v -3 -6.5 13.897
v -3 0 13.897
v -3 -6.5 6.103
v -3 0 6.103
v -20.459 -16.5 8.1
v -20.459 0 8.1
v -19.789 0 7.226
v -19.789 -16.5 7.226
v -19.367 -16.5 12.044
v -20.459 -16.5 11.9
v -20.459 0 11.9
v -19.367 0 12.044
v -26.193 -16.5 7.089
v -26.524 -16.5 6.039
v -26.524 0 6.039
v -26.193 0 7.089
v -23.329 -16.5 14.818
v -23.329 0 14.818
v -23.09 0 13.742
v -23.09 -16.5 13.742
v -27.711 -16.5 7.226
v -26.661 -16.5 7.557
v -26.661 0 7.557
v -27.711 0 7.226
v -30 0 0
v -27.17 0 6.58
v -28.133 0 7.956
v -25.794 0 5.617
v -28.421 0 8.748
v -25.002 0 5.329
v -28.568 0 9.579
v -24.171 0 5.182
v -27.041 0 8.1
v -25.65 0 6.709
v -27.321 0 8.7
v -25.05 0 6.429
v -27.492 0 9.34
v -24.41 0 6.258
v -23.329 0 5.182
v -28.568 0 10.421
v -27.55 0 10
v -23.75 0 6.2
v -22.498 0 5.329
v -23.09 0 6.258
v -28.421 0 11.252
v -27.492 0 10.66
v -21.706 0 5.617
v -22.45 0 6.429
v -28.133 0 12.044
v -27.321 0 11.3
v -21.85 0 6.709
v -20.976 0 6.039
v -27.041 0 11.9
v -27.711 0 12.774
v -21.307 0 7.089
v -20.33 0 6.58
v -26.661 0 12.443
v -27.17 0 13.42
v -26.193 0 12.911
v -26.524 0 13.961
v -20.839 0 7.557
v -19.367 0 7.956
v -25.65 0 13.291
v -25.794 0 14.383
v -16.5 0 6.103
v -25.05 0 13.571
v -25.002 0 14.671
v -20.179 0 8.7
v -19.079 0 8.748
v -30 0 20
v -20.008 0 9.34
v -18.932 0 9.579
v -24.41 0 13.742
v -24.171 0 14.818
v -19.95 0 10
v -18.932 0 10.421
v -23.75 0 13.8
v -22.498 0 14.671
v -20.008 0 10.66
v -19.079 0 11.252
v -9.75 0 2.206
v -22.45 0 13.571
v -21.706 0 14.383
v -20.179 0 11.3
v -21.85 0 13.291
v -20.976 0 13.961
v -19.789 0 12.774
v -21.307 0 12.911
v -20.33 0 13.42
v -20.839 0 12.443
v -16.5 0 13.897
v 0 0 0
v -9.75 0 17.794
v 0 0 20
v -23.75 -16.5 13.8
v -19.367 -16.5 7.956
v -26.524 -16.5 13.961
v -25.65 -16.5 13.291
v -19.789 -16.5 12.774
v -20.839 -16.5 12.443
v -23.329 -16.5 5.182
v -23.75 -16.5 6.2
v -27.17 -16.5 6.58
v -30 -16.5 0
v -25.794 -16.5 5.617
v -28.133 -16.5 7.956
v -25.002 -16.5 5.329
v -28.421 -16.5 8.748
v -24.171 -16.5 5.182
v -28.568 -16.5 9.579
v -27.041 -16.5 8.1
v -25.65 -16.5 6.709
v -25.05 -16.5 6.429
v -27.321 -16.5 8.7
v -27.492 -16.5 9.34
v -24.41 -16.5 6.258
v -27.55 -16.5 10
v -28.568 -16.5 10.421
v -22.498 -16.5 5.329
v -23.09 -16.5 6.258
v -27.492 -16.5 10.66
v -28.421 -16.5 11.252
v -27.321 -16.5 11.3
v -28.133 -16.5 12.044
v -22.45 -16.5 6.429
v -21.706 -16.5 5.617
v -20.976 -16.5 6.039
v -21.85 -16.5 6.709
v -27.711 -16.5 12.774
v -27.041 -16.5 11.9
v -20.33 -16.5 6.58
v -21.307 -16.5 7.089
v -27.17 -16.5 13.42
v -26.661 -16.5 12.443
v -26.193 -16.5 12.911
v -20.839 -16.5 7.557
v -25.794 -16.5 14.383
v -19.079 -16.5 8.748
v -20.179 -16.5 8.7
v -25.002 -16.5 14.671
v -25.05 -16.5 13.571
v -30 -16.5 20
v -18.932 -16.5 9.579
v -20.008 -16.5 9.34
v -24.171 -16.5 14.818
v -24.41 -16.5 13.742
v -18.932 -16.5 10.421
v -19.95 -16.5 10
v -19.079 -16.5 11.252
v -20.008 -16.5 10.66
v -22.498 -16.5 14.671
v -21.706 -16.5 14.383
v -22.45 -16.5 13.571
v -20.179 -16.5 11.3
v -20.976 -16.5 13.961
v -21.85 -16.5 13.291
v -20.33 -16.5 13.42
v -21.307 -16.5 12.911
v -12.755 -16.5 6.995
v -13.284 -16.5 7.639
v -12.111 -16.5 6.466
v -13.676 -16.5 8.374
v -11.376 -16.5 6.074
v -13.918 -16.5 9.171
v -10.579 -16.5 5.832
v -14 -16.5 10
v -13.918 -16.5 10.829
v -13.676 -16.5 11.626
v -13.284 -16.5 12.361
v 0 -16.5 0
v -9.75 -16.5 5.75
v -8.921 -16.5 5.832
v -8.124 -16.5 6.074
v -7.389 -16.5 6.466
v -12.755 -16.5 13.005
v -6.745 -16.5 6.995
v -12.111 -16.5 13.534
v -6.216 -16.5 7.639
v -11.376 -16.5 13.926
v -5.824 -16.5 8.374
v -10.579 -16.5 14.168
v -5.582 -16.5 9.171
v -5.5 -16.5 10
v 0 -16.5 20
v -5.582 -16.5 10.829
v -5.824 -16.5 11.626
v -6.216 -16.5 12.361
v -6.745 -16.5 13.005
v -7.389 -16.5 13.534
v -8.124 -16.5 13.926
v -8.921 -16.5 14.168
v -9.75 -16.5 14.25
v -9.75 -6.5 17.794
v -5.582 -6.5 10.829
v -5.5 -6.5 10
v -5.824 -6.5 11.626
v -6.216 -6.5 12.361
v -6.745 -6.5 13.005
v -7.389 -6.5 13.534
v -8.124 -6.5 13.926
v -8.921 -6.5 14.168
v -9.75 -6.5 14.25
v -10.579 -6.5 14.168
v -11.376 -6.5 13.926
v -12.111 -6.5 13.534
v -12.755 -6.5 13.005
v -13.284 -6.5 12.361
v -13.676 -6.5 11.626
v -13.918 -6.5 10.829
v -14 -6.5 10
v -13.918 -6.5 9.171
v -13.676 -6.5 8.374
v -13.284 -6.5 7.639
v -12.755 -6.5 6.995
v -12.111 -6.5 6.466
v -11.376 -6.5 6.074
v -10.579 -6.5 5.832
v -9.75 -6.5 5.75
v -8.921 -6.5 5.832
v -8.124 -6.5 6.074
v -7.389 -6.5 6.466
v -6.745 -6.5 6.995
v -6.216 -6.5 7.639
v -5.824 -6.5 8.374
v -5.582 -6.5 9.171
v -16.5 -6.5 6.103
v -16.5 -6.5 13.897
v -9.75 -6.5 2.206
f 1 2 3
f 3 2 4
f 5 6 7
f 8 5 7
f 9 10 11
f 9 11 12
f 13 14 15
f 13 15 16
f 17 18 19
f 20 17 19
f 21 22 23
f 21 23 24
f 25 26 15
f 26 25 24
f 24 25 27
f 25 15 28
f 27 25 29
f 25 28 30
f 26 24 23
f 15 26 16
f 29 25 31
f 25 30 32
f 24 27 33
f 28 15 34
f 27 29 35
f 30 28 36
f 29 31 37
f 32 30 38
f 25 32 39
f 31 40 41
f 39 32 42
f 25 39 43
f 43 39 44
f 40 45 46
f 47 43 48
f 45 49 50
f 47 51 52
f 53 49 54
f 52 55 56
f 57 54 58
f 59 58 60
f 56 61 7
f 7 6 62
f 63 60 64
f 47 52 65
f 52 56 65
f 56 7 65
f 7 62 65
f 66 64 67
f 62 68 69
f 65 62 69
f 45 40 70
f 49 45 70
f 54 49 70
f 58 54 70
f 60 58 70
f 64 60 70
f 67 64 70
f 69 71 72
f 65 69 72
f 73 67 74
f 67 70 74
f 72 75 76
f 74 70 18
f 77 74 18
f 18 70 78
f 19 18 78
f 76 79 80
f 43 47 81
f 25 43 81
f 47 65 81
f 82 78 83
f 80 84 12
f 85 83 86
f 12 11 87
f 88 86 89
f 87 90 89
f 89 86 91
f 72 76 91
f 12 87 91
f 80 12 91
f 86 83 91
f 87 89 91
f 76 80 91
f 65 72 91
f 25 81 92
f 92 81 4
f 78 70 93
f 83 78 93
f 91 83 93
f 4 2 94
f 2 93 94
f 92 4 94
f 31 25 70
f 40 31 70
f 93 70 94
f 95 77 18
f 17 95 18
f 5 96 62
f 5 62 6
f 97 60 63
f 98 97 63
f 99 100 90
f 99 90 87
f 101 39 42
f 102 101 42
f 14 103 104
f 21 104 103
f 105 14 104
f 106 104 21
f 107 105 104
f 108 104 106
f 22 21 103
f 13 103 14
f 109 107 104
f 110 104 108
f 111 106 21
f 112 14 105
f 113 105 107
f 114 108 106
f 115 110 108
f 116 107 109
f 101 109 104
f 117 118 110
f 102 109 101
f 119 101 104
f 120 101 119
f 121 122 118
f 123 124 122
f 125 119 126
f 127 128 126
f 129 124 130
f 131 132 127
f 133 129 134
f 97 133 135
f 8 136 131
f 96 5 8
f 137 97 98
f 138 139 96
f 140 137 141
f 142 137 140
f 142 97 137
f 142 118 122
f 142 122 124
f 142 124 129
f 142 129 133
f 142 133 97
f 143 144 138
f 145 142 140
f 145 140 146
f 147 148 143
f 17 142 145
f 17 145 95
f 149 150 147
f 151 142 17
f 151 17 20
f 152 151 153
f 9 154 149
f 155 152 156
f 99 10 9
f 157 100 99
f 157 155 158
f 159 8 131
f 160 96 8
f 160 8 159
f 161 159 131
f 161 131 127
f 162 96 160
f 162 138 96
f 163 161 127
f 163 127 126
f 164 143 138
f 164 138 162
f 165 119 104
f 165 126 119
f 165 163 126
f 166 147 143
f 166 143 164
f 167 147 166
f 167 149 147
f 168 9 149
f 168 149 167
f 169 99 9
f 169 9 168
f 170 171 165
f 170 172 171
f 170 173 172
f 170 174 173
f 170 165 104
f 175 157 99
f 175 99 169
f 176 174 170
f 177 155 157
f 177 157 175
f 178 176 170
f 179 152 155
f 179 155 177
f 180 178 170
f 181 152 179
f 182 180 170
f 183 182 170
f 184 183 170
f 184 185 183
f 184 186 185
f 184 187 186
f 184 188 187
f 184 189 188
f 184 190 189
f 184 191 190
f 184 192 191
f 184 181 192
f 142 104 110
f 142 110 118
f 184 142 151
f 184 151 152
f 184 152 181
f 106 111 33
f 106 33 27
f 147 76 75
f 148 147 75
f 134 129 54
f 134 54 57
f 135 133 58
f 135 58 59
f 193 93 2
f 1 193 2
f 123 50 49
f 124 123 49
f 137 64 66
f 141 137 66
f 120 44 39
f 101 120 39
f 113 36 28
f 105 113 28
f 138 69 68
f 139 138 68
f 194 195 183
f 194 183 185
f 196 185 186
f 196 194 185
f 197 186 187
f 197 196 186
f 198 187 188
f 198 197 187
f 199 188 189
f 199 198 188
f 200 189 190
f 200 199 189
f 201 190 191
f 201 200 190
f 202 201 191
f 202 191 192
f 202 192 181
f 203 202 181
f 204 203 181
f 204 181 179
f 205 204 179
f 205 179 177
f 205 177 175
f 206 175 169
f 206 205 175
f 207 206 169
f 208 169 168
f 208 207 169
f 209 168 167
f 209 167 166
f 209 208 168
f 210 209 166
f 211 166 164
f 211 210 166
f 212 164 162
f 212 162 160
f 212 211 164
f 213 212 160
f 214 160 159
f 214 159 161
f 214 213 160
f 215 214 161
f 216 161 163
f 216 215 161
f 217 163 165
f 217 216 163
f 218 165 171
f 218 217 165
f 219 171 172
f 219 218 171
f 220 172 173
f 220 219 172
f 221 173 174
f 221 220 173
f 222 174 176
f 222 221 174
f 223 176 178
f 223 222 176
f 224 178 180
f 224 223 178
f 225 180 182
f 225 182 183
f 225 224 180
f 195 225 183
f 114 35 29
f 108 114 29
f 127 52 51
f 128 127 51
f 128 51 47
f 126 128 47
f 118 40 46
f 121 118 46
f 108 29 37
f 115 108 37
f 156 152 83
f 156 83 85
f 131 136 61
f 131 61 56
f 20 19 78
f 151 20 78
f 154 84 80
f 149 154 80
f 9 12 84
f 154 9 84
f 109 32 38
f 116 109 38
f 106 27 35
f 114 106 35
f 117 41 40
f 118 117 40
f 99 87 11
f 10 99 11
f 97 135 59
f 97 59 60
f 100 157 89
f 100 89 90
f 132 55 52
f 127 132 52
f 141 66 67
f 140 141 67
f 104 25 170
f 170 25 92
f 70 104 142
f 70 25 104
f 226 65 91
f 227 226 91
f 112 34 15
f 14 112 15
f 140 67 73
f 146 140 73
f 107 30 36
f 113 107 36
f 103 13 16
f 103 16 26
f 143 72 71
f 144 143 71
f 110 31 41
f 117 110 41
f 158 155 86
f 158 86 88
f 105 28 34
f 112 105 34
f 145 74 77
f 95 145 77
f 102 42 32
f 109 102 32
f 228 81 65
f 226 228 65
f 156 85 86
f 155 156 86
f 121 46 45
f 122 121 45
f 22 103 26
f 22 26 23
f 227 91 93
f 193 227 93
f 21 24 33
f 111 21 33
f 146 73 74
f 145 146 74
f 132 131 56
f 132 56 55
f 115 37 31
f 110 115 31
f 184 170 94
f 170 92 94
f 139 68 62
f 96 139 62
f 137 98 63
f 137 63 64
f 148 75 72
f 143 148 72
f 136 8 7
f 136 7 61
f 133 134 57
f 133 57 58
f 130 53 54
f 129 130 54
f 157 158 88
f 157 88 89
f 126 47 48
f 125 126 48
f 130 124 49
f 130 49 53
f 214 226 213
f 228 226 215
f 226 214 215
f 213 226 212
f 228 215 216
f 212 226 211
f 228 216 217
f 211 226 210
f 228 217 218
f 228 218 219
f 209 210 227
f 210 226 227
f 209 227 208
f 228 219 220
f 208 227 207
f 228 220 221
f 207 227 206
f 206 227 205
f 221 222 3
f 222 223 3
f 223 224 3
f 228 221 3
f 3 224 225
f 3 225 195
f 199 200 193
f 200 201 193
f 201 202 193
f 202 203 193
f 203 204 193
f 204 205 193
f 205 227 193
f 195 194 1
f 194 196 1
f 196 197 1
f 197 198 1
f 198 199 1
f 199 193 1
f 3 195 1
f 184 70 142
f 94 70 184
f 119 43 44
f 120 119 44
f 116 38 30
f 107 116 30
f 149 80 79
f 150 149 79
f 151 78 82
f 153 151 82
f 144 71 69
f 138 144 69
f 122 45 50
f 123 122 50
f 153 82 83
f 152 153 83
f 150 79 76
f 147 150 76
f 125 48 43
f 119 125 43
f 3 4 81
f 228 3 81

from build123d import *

# Parameters (mm, degrees)
F0_W     = 30
F0_H     = 20
F0_R     = 3.8
F1_DEPTH = 6.5
F2_W     = 30
F2_H     = 20
F2_R     = 3.8
F2_R_2   = 4.25
F3_DEPTH = 10
F5_DEPTH = 25


with BuildPart() as f1:
    # F0 (on Front) → F1 (new body)
    with BuildSketch(Plane.XZ):
        with Locations((-15, 10)):
            Rectangle(F0_W, F0_H)
        Polygon((-3, 6.102885683), (-9.75, 2.2057713659), (-16.5, 6.102885683), (-16.5, 13.897114317), (-9.75, 17.7942286341), (-3, 13.897114317), align=None, mode=Mode.SUBTRACT)
        with Locations((-23.75, 10)):
            Circle(F0_R, mode=Mode.SUBTRACT)
    extrude(amount=F1_DEPTH)

    # F2 (on face) → F3 (join)
    with BuildSketch(Plane.XZ.offset(6.5)):
        with Locations((-15, 10)):
            Rectangle(F2_W, F2_H)
        with Locations((-23.75, 10)):
            Circle(F2_R, mode=Mode.SUBTRACT)
        with Locations((-9.75, 10)):
            Circle(F2_R_2, mode=Mode.SUBTRACT)
    extrude(amount=F3_DEPTH)

    # F4 (on face) → F5 (cut)
    with BuildSketch(Plane(origin=(0, 0, 0), x_dir=(-1, 0, 0), z_dir=(0, 1, 0))):
        with BuildLine():
            ThreePointArc((23.0901369249, 13.7422694614), (23.4188081776, 13.7855398527), (23.75, 13.8))
            Line((23.75, 13.8), (23.3285195244, 14.8175438804))
            Line((23.3285195244, 14.8175438804), (23.0901369249, 13.7422694614))
        make_face()
        with BuildLine():
            Line((24.1714804756, 14.8175438804), (23.75, 13.8))
            ThreePointArc((23.75, 13.8), (24.0811918224, 13.7855398527), (24.4098630751, 13.7422694614))
            Line((24.4098630751, 13.7422694614), (24.1714804756, 14.8175438804))
        make_face()
        with BuildLine():
            ThreePointArc((24.4098630751, 13.7422694614), (24.0811918224, 13.7855398527), (23.75, 13.8))
            ThreePointArc((23.75, 13.8), (23.4188081776, 13.7855398527), (23.0901369249, 13.7422694614))
            ThreePointArc((23.0901369249, 13.7422694614), (22.7664876286, 13.6705181399), (22.4503234554, 13.570831959))
            ThreePointArc((22.4503234554, 13.570831959), (22.1440506054, 13.4439695907), (21.85, 13.2908965344))
            ThreePointArc((21.85, 13.2908965344), (21.5704095419, 13.1127777683), (21.3074070832, 12.9109688839))
            ThreePointArc((21.3074070832, 12.9109688839), (21.0629942315, 12.6870057685), (20.8390311161, 12.4425929168))
            ThreePointArc((20.8390311161, 12.4425929168), (20.6372222317, 12.1795904581), (20.4591034656, 11.9))
            ThreePointArc((20.4591034656, 11.9), (20.3060304093, 11.6059493946), (20.179168041, 11.2996765446))
            ThreePointArc((20.179168041, 11.2996765446), (20.0794818601, 10.9835123714), (20.0077305386, 10.6598630751))
            ThreePointArc((20.0077305386, 10.6598630751), (19.9644601473, 10.3311918224), (19.95, 10))
            ThreePointArc((19.95, 10), (19.9644601473, 9.6688081776), (20.0077305386, 9.3401369249))
            ThreePointArc((20.0077305386, 9.3401369249), (20.0794818601, 9.0164876286), (20.179168041, 8.7003234554))
            ThreePointArc((20.179168041, 8.7003234554), (20.3060304093, 8.3940506054), (20.4591034656, 8.1))
            ThreePointArc((20.4591034656, 8.1), (20.6372222317, 7.8204095419), (20.8390311161, 7.5574070832))
            ThreePointArc((20.8390311161, 7.5574070832), (21.0629942315, 7.3129942315), (21.3074070832, 7.0890311161))
            ThreePointArc((21.3074070832, 7.0890311161), (21.5704095419, 6.8872222317), (21.85, 6.7091034656))
            ThreePointArc((21.85, 6.7091034656), (22.1440506054, 6.5560304093), (22.4503234554, 6.429168041))
            ThreePointArc((22.4503234554, 6.429168041), (22.7664876286, 6.3294818601), (23.0901369249, 6.2577305386))
            ThreePointArc((23.0901369249, 6.2577305386), (23.4188081776, 6.2144601473), (23.75, 6.2))
            ThreePointArc((23.75, 6.2), (24.0811918224, 6.2144601473), (24.4098630751, 6.2577305386))
            ThreePointArc((24.4098630751, 6.2577305386), (24.7335123714, 6.3294818601), (25.0496765446, 6.429168041))
            ThreePointArc((25.0496765446, 6.429168041), (25.3559493946, 6.5560304093), (25.65, 6.7091034656))
            ThreePointArc((25.65, 6.7091034656), (25.9295904581, 6.8872222317), (26.1925929168, 7.0890311161))
            ThreePointArc((26.1925929168, 7.0890311161), (26.4370057685, 7.3129942315), (26.6609688839, 7.5574070832))
            ThreePointArc((26.6609688839, 7.5574070832), (26.8627777683, 7.8204095419), (27.0408965344, 8.1))
            ThreePointArc((27.0408965344, 8.1), (27.1939695907, 8.3940506054), (27.320831959, 8.7003234554))
            ThreePointArc((27.320831959, 8.7003234554), (27.4205181399, 9.0164876286), (27.4922694614, 9.3401369249))
            ThreePointArc((27.4922694614, 9.3401369249), (27.5355398527, 9.6688081776), (27.55, 10))
            ThreePointArc((27.55, 10), (27.5355398527, 10.3311918224), (27.4922694614, 10.6598630751))
            ThreePointArc((27.4922694614, 10.6598630751), (27.4205181399, 10.9835123714), (27.320831959, 11.2996765446))
            ThreePointArc((27.320831959, 11.2996765446), (27.1939695907, 11.6059493946), (27.0408965344, 11.9))
            ThreePointArc((27.0408965344, 11.9), (26.8627777683, 12.1795904581), (26.6609688839, 12.4425929168))
            ThreePointArc((26.6609688839, 12.4425929168), (26.4370057685, 12.6870057685), (26.1925929168, 12.9109688839))
            ThreePointArc((26.1925929168, 12.9109688839), (25.9295904581, 13.1127777683), (25.65, 13.2908965344))
            ThreePointArc((25.65, 13.2908965344), (25.3559493946, 13.4439695907), (25.0496765446, 13.570831959))
            ThreePointArc((25.0496765446, 13.570831959), (24.7335123714, 13.6705181399), (24.4098630751, 13.7422694614))
        make_face()
        with BuildLine():
            Line((25.0016349558, 14.6711652474), (24.4098630751, 13.7422694614))
            ThreePointArc((24.4098630751, 13.7422694614), (24.7335123714, 13.6705181399), (25.0496765446, 13.570831959))
            Line((25.0496765446, 13.570831959), (25.0016349558, 14.6711652474))
        make_face()
        with BuildLine():
            ThreePointArc((22.4503234554, 13.570831959), (22.7664876286, 13.6705181399), (23.0901369249, 13.7422694614))
            Line((23.0901369249, 13.7422694614), (22.4983650442, 14.6711652474))
            Line((22.4983650442, 14.6711652474), (22.4503234554, 13.570831959))
        make_face()
        with BuildLine():
            Line((25.7937591412, 14.3828556221), (25.0496765446, 13.570831959))
            ThreePointArc((25.0496765446, 13.570831959), (25.3559493946, 13.4439695907), (25.65, 13.2908965344))
            Line((25.65, 13.2908965344), (25.7937591412, 14.3828556221))
        make_face()
        with BuildLine():
            ThreePointArc((21.85, 13.2908965344), (22.1440506054, 13.4439695907), (22.4503234554, 13.570831959))
            Line((22.4503234554, 13.570831959), (21.7062408588, 14.3828556221))
            Line((21.7062408588, 14.3828556221), (21.85, 13.2908965344))
        make_face()
        with BuildLine():
            Line((26.5237847392, 13.9613751465), (25.65, 13.2908965344))
            ThreePointArc((25.65, 13.2908965344), (25.9295904581, 13.1127777683), (26.1925929168, 12.9109688839))
            Line((26.1925929168, 12.9109688839), (26.5237847392, 13.9613751465))
        make_face()
        with BuildLine():
            ThreePointArc((21.3074070832, 12.9109688839), (21.5704095419, 13.1127777683), (21.85, 13.2908965344))
            Line((21.85, 13.2908965344), (20.9762152608, 13.9613751465))
            Line((20.9762152608, 13.9613751465), (21.3074070832, 12.9109688839))
        make_face()
        with BuildLine():
            Line((27.1695302916, 13.4195302916), (26.1925929168, 12.9109688839))
            ThreePointArc((26.1925929168, 12.9109688839), (26.4370057685, 12.6870057685), (26.6609688839, 12.4425929168))
            Line((26.6609688839, 12.4425929168), (27.1695302916, 13.4195302916))
        make_face()
        with BuildLine():
            ThreePointArc((20.8390311161, 12.4425929168), (21.0629942315, 12.6870057685), (21.3074070832, 12.9109688839))
            Line((21.3074070832, 12.9109688839), (20.3304697084, 13.4195302916))
            Line((20.3304697084, 13.4195302916), (20.8390311161, 12.4425929168))
        make_face()
        with BuildLine():
            Line((27.7113751465, 12.7737847392), (26.6609688839, 12.4425929168))
            ThreePointArc((26.6609688839, 12.4425929168), (26.8627777683, 12.1795904581), (27.0408965344, 11.9))
            Line((27.0408965344, 11.9), (27.7113751465, 12.7737847392))
        make_face()
        with BuildLine():
            ThreePointArc((20.4591034656, 11.9), (20.6372222317, 12.1795904581), (20.8390311161, 12.4425929168))
            Line((20.8390311161, 12.4425929168), (19.7886248535, 12.7737847392))
            Line((19.7886248535, 12.7737847392), (20.4591034656, 11.9))
        make_face()
        with BuildLine():
            Line((28.1328556221, 12.0437591412), (27.0408965344, 11.9))
            ThreePointArc((27.0408965344, 11.9), (27.1939695907, 11.6059493946), (27.320831959, 11.2996765446))
            Line((27.320831959, 11.2996765446), (28.1328556221, 12.0437591412))
        make_face()
        with BuildLine():
            ThreePointArc((20.179168041, 11.2996765446), (20.3060304093, 11.6059493946), (20.4591034656, 11.9))
            Line((20.4591034656, 11.9), (19.3671443779, 12.0437591412))
            Line((19.3671443779, 12.0437591412), (20.179168041, 11.2996765446))
        make_face()
        with BuildLine():
            Line((28.4211652474, 11.2516349558), (27.320831959, 11.2996765446))
            ThreePointArc((27.320831959, 11.2996765446), (27.4205181399, 10.9835123714), (27.4922694614, 10.6598630751))
            Line((27.4922694614, 10.6598630751), (28.4211652474, 11.2516349558))
        make_face()
        with BuildLine():
            ThreePointArc((20.0077305386, 10.6598630751), (20.0794818601, 10.9835123714), (20.179168041, 11.2996765446))
            Line((20.179168041, 11.2996765446), (19.0788347526, 11.2516349558))
            Line((19.0788347526, 11.2516349558), (20.0077305386, 10.6598630751))
        make_face()
        with BuildLine():
            Line((28.5675438804, 10.4214804756), (27.4922694614, 10.6598630751))
            ThreePointArc((27.4922694614, 10.6598630751), (27.5355398527, 10.3311918224), (27.55, 10))
            Line((27.55, 10), (28.5675438804, 10.4214804756))
        make_face()
        with BuildLine():
            ThreePointArc((19.95, 10), (19.9644601473, 10.3311918224), (20.0077305386, 10.6598630751))
            Line((20.0077305386, 10.6598630751), (18.9324561196, 10.4214804756))
            Line((18.9324561196, 10.4214804756), (19.95, 10))
        make_face()
        with BuildLine():
            Line((28.5675438804, 9.5785195244), (27.55, 10))
            ThreePointArc((27.55, 10), (27.5355398527, 9.6688081776), (27.4922694614, 9.3401369249))
            Line((27.4922694614, 9.3401369249), (28.5675438804, 9.5785195244))
        make_face()
        with BuildLine():
            ThreePointArc((20.0077305386, 9.3401369249), (19.9644601473, 9.6688081776), (19.95, 10))
            Line((19.95, 10), (18.9324561196, 9.5785195244))
            Line((18.9324561196, 9.5785195244), (20.0077305386, 9.3401369249))
        make_face()
        with BuildLine():
            Line((28.4211652474, 8.7483650442), (27.4922694614, 9.3401369249))
            ThreePointArc((27.4922694614, 9.3401369249), (27.4205181399, 9.0164876286), (27.320831959, 8.7003234554))
            Line((27.320831959, 8.7003234554), (28.4211652474, 8.7483650442))
        make_face()
        with BuildLine():
            ThreePointArc((20.179168041, 8.7003234554), (20.0794818601, 9.0164876286), (20.0077305386, 9.3401369249))
            Line((20.0077305386, 9.3401369249), (19.0788347526, 8.7483650442))
            Line((19.0788347526, 8.7483650442), (20.179168041, 8.7003234554))
        make_face()
        with BuildLine():
            Line((28.1328556221, 7.9562408588), (27.320831959, 8.7003234554))
            ThreePointArc((27.320831959, 8.7003234554), (27.1939695907, 8.3940506054), (27.0408965344, 8.1))
            Line((27.0408965344, 8.1), (28.1328556221, 7.9562408588))
        make_face()
        with BuildLine():
            ThreePointArc((20.4591034656, 8.1), (20.3060304093, 8.3940506054), (20.179168041, 8.7003234554))
            Line((20.179168041, 8.7003234554), (19.3671443779, 7.9562408588))
            Line((19.3671443779, 7.9562408588), (20.4591034656, 8.1))
        make_face()
        with BuildLine():
            Line((27.7113751465, 7.2262152608), (27.0408965344, 8.1))
            ThreePointArc((27.0408965344, 8.1), (26.8627777683, 7.8204095419), (26.6609688839, 7.5574070832))
            Line((26.6609688839, 7.5574070832), (27.7113751465, 7.2262152608))
        make_face()
        with BuildLine():
            ThreePointArc((20.8390311161, 7.5574070832), (20.6372222317, 7.8204095419), (20.4591034656, 8.1))
            Line((20.4591034656, 8.1), (19.7886248535, 7.2262152608))
            Line((19.7886248535, 7.2262152608), (20.8390311161, 7.5574070832))
        make_face()
        with BuildLine():
            Line((27.1695302916, 6.5804697084), (26.6609688839, 7.5574070832))
            ThreePointArc((26.6609688839, 7.5574070832), (26.4370057685, 7.3129942315), (26.1925929168, 7.0890311161))
            Line((26.1925929168, 7.0890311161), (27.1695302916, 6.5804697084))
        make_face()
        with BuildLine():
            ThreePointArc((21.3074070832, 7.0890311161), (21.0629942315, 7.3129942315), (20.8390311161, 7.5574070832))
            Line((20.8390311161, 7.5574070832), (20.3304697084, 6.5804697084))
            Line((20.3304697084, 6.5804697084), (21.3074070832, 7.0890311161))
        make_face()
        with BuildLine():
            Line((26.5237847392, 6.0386248535), (26.1925929168, 7.0890311161))
            ThreePointArc((26.1925929168, 7.0890311161), (25.9295904581, 6.8872222317), (25.65, 6.7091034656))
            Line((25.65, 6.7091034656), (26.5237847392, 6.0386248535))
        make_face()
        with BuildLine():
            ThreePointArc((21.85, 6.7091034656), (21.5704095419, 6.8872222317), (21.3074070832, 7.0890311161))
            Line((21.3074070832, 7.0890311161), (20.9762152608, 6.0386248535))
            Line((20.9762152608, 6.0386248535), (21.85, 6.7091034656))
        make_face()
        with BuildLine():
            Line((25.7937591412, 5.6171443779), (25.65, 6.7091034656))
            ThreePointArc((25.65, 6.7091034656), (25.3559493946, 6.5560304093), (25.0496765446, 6.429168041))
            Line((25.0496765446, 6.429168041), (25.7937591412, 5.6171443779))
        make_face()
        with BuildLine():
            ThreePointArc((22.4503234554, 6.429168041), (22.1440506054, 6.5560304093), (21.85, 6.7091034656))
            Line((21.85, 6.7091034656), (21.7062408588, 5.6171443779))
            Line((21.7062408588, 5.6171443779), (22.4503234554, 6.429168041))
        make_face()
        with BuildLine():
            Line((25.0016349558, 5.3288347526), (25.0496765446, 6.429168041))
            ThreePointArc((25.0496765446, 6.429168041), (24.7335123714, 6.3294818601), (24.4098630751, 6.2577305386))
            Line((24.4098630751, 6.2577305386), (25.0016349558, 5.3288347526))
        make_face()
        with BuildLine():
            ThreePointArc((23.0901369249, 6.2577305386), (22.7664876286, 6.3294818601), (22.4503234554, 6.429168041))
            Line((22.4503234554, 6.429168041), (22.4983650442, 5.3288347526))
            Line((22.4983650442, 5.3288347526), (23.0901369249, 6.2577305386))
        make_face()
        with BuildLine():
            Line((24.1714804756, 5.1824561196), (24.4098630751, 6.2577305386))
            ThreePointArc((24.4098630751, 6.2577305386), (24.0811918224, 6.2144601473), (23.75, 6.2))
            Line((23.75, 6.2), (24.1714804756, 5.1824561196))
        make_face()
        with BuildLine():
            ThreePointArc((23.75, 6.2), (23.4188081776, 6.2144601473), (23.0901369249, 6.2577305386))
            Line((23.0901369249, 6.2577305386), (23.3285195244, 5.1824561196))
            Line((23.3285195244, 5.1824561196), (23.75, 6.2))
        make_face()
    extrude(amount=-F5_DEPTH, mode=Mode.SUBTRACT)


solid = f1.part
